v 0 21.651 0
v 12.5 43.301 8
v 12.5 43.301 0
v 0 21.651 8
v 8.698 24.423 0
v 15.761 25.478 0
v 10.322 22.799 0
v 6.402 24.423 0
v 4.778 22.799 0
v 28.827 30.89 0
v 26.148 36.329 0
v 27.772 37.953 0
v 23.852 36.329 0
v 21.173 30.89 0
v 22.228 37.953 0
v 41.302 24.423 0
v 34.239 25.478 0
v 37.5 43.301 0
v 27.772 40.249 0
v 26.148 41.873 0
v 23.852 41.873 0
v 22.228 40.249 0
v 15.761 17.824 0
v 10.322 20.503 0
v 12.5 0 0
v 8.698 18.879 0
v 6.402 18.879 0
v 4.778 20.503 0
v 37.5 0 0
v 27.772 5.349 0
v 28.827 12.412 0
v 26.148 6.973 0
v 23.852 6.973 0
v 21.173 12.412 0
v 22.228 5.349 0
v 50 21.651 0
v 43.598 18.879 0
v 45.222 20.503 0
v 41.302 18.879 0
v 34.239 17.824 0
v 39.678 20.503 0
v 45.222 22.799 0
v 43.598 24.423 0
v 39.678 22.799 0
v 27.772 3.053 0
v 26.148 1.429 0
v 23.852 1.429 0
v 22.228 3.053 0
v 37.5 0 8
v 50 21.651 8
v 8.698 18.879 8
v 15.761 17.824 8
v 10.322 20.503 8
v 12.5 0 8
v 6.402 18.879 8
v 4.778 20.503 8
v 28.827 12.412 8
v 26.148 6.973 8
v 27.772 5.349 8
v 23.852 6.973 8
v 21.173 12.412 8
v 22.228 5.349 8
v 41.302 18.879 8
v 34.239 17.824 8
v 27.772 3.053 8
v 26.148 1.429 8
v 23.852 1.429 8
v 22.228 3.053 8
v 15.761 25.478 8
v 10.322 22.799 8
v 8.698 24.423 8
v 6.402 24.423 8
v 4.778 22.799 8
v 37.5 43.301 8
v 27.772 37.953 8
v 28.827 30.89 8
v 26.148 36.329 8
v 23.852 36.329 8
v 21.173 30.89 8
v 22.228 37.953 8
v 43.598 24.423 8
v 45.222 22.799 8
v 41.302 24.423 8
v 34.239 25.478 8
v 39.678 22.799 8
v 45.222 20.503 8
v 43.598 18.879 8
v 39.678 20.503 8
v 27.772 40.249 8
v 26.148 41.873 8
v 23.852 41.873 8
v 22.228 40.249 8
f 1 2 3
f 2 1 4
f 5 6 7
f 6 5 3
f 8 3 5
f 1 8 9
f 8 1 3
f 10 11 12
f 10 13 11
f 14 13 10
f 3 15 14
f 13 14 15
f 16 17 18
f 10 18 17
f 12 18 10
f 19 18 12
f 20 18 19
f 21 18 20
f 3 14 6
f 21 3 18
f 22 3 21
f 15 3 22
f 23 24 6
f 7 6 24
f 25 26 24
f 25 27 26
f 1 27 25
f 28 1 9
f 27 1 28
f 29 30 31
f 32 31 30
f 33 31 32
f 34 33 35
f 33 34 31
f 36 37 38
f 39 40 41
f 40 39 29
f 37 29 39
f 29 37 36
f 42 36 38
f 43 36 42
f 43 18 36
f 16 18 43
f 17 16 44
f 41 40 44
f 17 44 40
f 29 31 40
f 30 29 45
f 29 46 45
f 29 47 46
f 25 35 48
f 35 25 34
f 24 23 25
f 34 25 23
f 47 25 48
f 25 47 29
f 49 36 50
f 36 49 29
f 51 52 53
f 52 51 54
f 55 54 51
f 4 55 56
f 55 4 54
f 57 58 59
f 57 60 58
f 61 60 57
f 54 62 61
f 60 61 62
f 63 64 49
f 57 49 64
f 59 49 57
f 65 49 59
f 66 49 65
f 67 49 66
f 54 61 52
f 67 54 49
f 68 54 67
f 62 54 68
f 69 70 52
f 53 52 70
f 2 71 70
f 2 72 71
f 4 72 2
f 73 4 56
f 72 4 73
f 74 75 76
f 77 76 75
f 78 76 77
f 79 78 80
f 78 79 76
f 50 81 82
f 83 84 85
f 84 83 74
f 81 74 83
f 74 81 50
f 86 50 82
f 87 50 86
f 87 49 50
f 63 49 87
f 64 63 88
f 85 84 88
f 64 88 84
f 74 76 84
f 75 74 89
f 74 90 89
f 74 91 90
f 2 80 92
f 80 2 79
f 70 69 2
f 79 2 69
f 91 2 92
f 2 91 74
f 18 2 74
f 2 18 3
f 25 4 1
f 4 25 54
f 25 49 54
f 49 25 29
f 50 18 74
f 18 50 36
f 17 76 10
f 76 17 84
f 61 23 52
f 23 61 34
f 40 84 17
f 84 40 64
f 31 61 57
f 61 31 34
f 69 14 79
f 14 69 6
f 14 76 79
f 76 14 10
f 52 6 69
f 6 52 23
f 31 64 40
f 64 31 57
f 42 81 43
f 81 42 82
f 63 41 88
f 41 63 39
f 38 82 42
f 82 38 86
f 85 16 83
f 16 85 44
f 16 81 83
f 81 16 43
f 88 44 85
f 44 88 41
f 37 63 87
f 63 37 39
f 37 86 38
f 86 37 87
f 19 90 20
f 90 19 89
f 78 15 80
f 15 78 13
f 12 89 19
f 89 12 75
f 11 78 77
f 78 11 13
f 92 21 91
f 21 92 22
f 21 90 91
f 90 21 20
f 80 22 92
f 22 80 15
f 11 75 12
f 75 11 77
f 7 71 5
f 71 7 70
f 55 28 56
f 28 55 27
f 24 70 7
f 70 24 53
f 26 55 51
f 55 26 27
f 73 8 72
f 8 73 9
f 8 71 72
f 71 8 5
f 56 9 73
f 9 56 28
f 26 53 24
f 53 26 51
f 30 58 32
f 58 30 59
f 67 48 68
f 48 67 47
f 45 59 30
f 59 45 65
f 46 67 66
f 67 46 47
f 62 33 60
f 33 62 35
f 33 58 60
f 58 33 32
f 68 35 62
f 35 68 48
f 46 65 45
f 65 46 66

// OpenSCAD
$fn = 32;

// ----------------------------------------------------------------------
// Polygon plate: 6-gon R25, 4 bolt windows
// ----------------------------------------------------------------------

// --- parameters (mm) ---
sides = 6;                // number of polygon sides
plate_r = 25;             // circumscribed radius of the polygon
bore_r = 10;              // centre bore radius
bolts = 4;                // number of bolt windows
ring_r = 17.45;           // bolt-circle radius
bolt_r = 3;               // bolt window radius
plate_t = 8;              // plate thickness, Z (extrusion height)

plate_d = 2 * plate_r;  // circumscribed diameter
bore_d = 2 * bore_r;  // centre bore diameter
bolt_d = 2 * bolt_r;  // bolt window diameter
ring_d = 2 * ring_r;  // bolt-circle diameter

profile = [[50, 21.651], [37.5, 43.301], [12.5, 43.301], [0, 21.651], [12.5, 0], [37.5, 0]];  // primary outline, 6 points, counter clockwise
void_1 = [[34.239, 25.478], [28.827, 30.89], [21.173, 30.89], [15.761, 25.478], [15.761, 17.824], [21.173, 12.412], [28.827, 12.412], [34.239, 17.824]];  // centre bore, 8 points
void_2 = [[45.222, 22.799], [43.598, 24.423], [41.302, 24.423], [39.678, 22.799], [39.678, 20.503], [41.302, 18.879], [43.598, 18.879], [45.222, 20.503]];  // bolt window 1, 8 points
void_3 = [[27.772, 40.249], [26.148, 41.873], [23.852, 41.873], [22.228, 40.249], [22.228, 37.953], [23.852, 36.329], [26.148, 36.329], [27.772, 37.953]];  // bolt window 2, 8 points
void_4 = [[10.322, 22.799], [8.698, 24.423], [6.402, 24.423], [4.778, 22.799], [4.778, 20.503], [6.402, 18.879], [8.698, 18.879], [10.322, 20.503]];  // bolt window 3, 8 points
void_5 = [[27.772, 5.349], [26.148, 6.973], [23.852, 6.973], [22.228, 5.349], [22.228, 3.053], [23.852, 1.429], [26.148, 1.429], [27.772, 3.053]];  // bolt window 4, 8 points

// --- the one profile operation ---
difference() {
  linear_extrude(height = plate_t) polygon(points = profile);
  translate([0, 0, -1])
    linear_extrude(height = plate_t + 2) polygon(points = void_1);
  translate([0, 0, -1])
    linear_extrude(height = plate_t + 2) polygon(points = void_2);
  translate([0, 0, -1])
    linear_extrude(height = plate_t + 2) polygon(points = void_3);
  translate([0, 0, -1])
    linear_extrude(height = plate_t + 2) polygon(points = void_4);
  translate([0, 0, -1])
    linear_extrude(height = plate_t + 2) polygon(points = void_5);
}
